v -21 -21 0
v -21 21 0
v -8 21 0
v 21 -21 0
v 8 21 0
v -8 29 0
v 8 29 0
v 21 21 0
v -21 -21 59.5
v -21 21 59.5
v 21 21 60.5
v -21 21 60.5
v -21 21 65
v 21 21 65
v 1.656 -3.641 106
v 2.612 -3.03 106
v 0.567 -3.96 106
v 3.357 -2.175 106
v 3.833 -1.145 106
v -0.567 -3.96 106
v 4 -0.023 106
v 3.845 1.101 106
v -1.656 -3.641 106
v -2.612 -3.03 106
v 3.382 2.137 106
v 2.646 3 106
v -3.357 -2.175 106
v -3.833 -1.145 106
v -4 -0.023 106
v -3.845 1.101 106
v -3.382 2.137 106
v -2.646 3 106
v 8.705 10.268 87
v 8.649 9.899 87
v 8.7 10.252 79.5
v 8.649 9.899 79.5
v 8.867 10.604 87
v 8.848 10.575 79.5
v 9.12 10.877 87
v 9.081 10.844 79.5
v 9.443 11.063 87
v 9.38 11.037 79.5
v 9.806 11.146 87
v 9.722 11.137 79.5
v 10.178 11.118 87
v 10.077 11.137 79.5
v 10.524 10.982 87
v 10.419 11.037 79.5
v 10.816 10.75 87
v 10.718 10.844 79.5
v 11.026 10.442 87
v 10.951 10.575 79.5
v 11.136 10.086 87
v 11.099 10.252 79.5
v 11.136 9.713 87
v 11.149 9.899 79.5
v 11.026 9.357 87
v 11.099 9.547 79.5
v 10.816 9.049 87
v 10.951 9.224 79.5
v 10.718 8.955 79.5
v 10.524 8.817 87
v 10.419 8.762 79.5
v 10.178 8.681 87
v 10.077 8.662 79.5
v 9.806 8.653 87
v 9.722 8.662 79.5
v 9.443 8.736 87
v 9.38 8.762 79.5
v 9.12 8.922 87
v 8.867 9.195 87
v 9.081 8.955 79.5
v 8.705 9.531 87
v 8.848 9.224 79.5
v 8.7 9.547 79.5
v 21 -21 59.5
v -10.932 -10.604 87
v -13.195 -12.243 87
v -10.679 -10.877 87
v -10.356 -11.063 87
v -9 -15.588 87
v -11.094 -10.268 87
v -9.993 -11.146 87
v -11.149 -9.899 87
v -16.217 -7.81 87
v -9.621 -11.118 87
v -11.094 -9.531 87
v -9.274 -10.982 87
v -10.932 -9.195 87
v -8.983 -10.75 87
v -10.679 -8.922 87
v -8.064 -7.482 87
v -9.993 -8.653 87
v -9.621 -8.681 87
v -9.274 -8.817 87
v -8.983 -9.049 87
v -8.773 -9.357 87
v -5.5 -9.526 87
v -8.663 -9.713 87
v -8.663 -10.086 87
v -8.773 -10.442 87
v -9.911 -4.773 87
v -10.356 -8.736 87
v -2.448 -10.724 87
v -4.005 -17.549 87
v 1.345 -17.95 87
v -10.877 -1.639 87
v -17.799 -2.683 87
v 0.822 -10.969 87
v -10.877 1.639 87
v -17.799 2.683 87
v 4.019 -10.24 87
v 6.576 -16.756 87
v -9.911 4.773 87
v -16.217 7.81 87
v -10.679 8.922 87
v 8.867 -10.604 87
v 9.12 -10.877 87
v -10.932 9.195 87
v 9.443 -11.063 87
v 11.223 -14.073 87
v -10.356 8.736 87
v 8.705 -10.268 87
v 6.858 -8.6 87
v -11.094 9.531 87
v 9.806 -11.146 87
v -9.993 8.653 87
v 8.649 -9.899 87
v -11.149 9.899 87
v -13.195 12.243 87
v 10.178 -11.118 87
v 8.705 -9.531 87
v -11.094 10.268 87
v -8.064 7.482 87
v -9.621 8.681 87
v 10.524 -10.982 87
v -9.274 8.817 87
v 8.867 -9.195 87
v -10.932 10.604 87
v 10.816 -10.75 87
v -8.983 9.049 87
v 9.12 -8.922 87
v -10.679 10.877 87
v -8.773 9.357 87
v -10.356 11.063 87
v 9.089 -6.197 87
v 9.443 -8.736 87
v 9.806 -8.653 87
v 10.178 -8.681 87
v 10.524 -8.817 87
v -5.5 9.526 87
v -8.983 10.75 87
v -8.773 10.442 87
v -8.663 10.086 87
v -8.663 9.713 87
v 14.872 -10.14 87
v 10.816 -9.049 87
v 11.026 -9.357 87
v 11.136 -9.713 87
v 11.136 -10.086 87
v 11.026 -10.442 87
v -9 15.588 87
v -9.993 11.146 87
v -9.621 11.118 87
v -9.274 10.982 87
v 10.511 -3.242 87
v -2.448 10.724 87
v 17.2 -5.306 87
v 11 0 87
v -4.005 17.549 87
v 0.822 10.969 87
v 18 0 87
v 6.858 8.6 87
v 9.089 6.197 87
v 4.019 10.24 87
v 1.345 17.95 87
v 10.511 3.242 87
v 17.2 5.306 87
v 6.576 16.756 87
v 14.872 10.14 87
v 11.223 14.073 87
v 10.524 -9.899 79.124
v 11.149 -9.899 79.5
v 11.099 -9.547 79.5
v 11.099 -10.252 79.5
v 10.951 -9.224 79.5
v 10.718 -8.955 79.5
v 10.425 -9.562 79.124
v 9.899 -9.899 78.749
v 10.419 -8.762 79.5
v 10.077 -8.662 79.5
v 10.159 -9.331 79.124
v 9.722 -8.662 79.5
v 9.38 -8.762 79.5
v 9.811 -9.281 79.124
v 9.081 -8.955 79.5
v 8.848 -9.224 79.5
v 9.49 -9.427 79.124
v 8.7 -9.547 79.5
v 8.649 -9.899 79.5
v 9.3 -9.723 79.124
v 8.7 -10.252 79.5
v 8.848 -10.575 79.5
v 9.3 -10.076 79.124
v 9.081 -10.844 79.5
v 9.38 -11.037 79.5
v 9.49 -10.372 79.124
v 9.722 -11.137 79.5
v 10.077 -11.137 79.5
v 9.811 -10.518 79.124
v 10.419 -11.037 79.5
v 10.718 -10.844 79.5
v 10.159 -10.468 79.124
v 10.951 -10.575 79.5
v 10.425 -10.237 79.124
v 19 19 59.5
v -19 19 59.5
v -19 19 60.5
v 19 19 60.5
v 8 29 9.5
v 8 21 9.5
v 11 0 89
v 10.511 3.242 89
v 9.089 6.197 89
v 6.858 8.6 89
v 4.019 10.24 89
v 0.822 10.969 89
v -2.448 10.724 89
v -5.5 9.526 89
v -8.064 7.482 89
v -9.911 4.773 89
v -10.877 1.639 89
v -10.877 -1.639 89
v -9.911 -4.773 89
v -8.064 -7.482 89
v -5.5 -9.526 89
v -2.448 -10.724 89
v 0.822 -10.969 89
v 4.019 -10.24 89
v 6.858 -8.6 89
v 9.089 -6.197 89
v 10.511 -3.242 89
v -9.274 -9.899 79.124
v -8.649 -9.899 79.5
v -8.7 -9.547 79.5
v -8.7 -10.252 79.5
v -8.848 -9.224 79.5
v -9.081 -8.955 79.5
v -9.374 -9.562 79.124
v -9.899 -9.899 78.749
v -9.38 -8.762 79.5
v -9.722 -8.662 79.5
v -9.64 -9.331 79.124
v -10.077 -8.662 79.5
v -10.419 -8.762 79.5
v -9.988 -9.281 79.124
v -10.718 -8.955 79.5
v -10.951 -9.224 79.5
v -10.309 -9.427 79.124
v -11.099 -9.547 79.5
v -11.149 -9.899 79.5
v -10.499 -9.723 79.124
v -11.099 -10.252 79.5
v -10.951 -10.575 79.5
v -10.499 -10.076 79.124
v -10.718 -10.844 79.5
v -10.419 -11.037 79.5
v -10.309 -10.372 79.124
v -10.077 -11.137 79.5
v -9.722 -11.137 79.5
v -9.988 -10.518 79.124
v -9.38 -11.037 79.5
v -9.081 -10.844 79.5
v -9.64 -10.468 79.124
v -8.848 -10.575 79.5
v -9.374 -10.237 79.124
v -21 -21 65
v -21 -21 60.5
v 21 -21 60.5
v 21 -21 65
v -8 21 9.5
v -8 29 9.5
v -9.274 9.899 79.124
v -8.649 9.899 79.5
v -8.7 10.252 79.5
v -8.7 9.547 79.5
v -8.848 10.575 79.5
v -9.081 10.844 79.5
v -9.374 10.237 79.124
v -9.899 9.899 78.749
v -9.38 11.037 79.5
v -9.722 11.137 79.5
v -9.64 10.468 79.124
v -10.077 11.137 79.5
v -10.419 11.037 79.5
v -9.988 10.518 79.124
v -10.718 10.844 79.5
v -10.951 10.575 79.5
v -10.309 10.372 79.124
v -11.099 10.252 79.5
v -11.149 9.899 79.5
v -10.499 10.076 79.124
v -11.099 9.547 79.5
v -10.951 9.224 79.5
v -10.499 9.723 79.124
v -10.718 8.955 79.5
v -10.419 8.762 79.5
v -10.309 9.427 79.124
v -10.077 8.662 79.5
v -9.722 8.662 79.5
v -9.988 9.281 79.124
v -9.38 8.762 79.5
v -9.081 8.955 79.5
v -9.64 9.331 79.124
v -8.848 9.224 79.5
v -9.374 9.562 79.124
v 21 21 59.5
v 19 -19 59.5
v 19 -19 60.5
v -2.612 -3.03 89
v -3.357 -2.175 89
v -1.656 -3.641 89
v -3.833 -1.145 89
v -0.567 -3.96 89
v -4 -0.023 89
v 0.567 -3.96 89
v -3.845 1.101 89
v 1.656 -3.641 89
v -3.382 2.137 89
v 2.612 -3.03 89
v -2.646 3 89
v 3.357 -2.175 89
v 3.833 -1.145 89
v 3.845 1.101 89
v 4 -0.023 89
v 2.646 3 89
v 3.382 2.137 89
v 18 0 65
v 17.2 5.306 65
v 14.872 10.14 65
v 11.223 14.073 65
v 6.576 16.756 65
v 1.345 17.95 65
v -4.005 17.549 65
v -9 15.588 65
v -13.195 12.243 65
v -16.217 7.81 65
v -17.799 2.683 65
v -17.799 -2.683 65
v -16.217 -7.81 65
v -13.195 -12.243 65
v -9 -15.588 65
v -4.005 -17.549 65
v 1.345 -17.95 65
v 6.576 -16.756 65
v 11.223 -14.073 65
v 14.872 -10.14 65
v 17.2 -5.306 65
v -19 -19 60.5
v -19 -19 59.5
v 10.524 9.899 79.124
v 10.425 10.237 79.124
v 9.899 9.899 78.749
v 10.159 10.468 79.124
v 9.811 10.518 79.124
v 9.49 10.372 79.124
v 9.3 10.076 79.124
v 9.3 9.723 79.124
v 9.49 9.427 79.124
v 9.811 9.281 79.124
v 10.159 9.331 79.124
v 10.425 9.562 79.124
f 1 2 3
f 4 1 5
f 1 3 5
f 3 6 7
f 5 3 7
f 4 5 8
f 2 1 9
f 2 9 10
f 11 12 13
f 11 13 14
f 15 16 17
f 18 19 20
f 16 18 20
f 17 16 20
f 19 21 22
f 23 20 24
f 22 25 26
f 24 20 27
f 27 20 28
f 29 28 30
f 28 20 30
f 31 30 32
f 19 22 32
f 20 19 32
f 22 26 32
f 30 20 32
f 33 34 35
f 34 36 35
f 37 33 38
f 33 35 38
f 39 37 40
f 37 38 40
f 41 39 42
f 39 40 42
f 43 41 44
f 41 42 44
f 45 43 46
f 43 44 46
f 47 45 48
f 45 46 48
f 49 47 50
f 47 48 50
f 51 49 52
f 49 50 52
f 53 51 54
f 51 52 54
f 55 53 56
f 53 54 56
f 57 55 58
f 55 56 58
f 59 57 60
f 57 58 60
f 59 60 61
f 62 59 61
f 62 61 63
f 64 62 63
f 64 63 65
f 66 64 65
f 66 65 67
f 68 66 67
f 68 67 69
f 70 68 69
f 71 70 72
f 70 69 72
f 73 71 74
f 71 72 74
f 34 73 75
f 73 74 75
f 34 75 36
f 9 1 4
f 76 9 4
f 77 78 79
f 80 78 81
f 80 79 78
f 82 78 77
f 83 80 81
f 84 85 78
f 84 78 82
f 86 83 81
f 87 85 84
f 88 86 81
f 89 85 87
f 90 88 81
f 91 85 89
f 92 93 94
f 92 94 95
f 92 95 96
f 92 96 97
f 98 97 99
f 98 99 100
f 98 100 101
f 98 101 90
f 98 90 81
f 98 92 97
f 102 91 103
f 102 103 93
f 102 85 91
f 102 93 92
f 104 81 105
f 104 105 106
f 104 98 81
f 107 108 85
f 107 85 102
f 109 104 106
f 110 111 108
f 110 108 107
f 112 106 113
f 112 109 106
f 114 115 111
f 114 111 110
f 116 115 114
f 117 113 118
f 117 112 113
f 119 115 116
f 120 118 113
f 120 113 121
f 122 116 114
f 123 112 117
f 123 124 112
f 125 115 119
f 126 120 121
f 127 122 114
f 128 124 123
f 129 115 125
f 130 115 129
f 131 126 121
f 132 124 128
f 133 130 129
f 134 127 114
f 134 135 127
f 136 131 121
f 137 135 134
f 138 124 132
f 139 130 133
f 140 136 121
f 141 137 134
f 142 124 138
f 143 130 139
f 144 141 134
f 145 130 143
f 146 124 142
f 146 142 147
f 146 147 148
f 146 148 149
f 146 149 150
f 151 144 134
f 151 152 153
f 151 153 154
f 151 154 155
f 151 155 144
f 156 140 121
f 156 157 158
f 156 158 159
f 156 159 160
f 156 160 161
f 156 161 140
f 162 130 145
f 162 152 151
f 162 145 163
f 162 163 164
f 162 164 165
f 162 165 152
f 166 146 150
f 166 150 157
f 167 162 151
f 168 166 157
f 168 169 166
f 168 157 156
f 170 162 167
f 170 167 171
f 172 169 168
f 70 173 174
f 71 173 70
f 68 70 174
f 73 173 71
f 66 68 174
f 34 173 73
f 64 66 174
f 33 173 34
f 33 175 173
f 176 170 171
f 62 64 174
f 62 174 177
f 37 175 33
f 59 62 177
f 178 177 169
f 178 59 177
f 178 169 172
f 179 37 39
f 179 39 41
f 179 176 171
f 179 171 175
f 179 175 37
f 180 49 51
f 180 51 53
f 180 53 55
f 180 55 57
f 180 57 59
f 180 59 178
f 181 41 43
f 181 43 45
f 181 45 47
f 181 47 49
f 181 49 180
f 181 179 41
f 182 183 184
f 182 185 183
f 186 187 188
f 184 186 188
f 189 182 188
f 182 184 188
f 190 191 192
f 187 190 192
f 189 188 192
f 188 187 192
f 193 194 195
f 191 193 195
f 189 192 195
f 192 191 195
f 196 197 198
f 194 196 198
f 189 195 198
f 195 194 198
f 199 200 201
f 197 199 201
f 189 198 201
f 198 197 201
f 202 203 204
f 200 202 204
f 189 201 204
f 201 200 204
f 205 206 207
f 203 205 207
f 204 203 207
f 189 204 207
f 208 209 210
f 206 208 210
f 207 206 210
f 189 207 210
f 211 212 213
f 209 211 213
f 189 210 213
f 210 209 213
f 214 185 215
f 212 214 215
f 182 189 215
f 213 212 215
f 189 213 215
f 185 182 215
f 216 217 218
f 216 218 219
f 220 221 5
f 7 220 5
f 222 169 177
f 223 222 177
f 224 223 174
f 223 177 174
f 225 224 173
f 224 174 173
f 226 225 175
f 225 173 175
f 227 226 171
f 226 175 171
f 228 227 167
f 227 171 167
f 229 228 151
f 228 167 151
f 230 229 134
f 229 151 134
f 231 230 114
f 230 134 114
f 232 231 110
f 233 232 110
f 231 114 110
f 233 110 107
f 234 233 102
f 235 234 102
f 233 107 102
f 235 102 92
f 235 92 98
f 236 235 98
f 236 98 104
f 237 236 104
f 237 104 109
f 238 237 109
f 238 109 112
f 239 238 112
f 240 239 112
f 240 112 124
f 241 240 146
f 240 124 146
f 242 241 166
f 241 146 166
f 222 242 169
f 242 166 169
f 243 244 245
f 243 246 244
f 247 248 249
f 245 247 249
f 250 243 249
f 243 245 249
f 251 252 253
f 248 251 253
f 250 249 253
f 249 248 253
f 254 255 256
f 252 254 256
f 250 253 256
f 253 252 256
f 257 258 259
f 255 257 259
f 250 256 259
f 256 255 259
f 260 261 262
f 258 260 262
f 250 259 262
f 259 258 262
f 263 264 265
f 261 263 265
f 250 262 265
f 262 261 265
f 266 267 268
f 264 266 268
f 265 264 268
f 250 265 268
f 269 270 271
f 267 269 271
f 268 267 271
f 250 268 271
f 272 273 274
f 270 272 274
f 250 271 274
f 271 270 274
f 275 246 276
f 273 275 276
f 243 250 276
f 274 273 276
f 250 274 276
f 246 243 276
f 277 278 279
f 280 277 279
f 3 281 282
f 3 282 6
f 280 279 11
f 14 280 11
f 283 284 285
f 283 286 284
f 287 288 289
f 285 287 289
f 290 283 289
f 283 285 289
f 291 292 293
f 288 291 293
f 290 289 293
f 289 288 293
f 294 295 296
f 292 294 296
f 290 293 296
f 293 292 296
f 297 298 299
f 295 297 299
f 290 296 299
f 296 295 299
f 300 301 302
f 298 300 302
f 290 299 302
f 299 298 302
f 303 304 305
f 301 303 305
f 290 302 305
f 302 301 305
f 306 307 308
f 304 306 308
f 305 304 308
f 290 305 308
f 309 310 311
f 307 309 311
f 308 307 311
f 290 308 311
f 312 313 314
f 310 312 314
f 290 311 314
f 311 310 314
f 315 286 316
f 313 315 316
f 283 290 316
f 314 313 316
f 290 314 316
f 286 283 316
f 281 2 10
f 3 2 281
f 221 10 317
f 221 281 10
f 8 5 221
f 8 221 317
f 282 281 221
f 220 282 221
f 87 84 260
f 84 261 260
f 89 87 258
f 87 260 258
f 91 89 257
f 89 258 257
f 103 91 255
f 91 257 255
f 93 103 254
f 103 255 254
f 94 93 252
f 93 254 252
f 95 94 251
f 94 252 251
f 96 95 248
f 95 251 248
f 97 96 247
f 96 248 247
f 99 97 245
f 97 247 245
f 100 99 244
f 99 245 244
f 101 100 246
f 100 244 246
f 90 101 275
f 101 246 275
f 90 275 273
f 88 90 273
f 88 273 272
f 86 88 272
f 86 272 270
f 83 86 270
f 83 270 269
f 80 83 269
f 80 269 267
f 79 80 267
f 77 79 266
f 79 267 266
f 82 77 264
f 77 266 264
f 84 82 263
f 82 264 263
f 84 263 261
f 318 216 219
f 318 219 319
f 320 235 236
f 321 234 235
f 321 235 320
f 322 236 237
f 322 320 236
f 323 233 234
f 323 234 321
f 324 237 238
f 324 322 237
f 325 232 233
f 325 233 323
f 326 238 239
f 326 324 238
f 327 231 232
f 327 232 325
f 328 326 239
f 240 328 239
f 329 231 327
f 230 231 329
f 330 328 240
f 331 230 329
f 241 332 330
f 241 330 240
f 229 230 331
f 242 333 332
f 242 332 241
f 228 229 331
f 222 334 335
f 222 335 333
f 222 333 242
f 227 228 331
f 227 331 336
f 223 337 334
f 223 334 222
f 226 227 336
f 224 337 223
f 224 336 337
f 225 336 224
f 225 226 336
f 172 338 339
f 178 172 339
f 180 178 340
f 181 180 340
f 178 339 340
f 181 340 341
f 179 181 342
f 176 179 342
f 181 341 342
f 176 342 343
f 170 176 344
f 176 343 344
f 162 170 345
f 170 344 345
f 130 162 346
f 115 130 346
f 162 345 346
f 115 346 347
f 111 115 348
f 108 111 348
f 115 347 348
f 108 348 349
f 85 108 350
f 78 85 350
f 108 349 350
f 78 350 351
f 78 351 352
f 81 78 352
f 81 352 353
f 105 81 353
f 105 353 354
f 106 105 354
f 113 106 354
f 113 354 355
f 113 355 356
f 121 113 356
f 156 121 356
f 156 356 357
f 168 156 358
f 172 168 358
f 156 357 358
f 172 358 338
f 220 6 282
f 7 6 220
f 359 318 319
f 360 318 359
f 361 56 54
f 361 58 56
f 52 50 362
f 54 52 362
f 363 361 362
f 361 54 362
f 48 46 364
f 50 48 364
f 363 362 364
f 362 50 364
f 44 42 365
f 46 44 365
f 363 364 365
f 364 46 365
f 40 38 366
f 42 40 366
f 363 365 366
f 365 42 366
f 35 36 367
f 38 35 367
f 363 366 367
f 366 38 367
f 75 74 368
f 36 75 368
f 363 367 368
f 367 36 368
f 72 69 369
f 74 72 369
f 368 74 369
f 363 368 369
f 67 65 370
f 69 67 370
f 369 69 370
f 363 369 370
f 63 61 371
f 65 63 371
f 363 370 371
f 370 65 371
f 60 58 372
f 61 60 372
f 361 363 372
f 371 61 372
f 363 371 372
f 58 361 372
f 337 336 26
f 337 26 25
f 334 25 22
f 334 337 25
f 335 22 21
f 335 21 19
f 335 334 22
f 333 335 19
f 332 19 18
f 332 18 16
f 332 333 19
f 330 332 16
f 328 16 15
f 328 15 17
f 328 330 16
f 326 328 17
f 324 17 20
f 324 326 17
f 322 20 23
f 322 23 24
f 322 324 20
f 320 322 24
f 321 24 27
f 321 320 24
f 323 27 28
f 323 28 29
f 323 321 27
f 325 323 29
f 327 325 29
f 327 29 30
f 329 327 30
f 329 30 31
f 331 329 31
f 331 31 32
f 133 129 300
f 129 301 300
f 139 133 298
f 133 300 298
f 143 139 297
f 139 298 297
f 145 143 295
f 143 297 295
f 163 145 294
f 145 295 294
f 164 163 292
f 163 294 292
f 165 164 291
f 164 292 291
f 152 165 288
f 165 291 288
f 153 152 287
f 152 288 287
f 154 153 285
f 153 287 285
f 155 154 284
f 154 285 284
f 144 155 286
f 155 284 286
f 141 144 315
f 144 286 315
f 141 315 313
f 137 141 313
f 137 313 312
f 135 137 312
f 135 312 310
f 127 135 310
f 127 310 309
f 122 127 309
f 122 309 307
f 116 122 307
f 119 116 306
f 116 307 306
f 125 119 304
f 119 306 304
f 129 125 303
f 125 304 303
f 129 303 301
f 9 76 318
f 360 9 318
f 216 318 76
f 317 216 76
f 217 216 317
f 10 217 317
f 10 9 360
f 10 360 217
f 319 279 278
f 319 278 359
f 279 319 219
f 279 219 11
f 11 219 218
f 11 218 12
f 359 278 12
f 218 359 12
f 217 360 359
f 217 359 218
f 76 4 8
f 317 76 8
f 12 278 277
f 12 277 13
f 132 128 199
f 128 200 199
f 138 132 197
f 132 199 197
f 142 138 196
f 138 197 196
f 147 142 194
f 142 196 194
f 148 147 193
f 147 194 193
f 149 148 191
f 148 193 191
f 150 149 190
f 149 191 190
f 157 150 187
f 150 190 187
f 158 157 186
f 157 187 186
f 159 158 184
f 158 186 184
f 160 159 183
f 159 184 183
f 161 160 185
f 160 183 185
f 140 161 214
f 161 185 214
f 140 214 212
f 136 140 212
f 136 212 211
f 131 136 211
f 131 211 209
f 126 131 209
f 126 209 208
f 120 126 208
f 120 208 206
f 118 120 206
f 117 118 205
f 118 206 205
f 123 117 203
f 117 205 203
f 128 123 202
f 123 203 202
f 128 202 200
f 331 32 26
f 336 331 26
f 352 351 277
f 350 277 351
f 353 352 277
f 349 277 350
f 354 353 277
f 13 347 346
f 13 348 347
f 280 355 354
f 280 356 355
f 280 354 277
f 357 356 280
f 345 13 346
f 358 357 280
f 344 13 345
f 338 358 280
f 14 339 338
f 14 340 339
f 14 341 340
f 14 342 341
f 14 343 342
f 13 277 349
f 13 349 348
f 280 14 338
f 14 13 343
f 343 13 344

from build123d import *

# Parameters (mm, degrees)
SKETCH_1_W               = 42
SKETCH_1_H               = 42
EXTRUDE_1_DEPTH          = 65
SKETCH_2_R               = 18
EXTRUDE_2_DEPTH          = 22
EXTRUDE_3_DEPTH          = 19
SKETCH_4_R               = 11
EXTRUDE_4_DEPTH          = 2
SKETCH_6_W               = 43
SKETCH_6_H               = 1
CUT_EXTRUDE_1_DEPTH      = 2
PATTERN_CIRCULAR_1_COUNT = 4
HOLE_WIZARD_M3_1_D       = 2.5
HOLE_WIZARD_M3_1_DEPTH   = 7.5
HOLE_WIZARD_M3_1_TIP     = 0.751075774
SKETCH_9_W               = 16
SKETCH_9_H               = 9.5
EXTRUDE_5_DEPTH          = 8


with BuildPart() as part:
    # 草图1 → 凸台-拉伸1 (new body)
    with BuildSketch(Plane.XY):
        Rectangle(SKETCH_1_W, SKETCH_1_H)
    extrude(amount=EXTRUDE_1_DEPTH)

    # 草图2 → 凸台-拉伸2 (add)
    with BuildSketch(Plane.XY.offset(65)):
        Circle(SKETCH_2_R)
    extrude(amount=EXTRUDE_2_DEPTH)

    # 草图3 → 凸台-拉伸3 (add)
    with BuildSketch(Plane.XY.offset(87)):
        with BuildLine():
            Line((-2.645751311, 3), (2.645751311, 3))
            ThreePointArc((2.645751311, 3), (0, -4), (-2.645751311, 3))
        make_face()
    extrude(amount=EXTRUDE_3_DEPTH)

    # 草图4 → 凸台-拉伸4 (add)
    with BuildSketch(Plane.XY.offset(87)):
        Circle(SKETCH_4_R)
    extrude(amount=EXTRUDE_4_DEPTH)

    # 草图6 → 切除-拉伸1 (cut)
    with BuildSketch(Plane(origin=(0, 21, 0), x_dir=(1, 0, 0), z_dir=(0, 1, 0))):
        with Locations((0, -60)):
            Rectangle(SKETCH_6_W, SKETCH_6_H)
    cut_extrude_1 = extrude(amount=-CUT_EXTRUDE_1_DEPTH, mode=Mode.SUBTRACT)

    # 阵列(圆周)1: 切除-拉伸1 ×4 about axis
    pattern_circular_1_axis = Axis((0, 0, 0), (0, 0, 1))
    for i in range(1, PATTERN_CIRCULAR_1_COUNT):
        add(cut_extrude_1.rotate(pattern_circular_1_axis, i * 360 / PATTERN_CIRCULAR_1_COUNT), mode=Mode.SUBTRACT)

    # M3 螺纹孔1
    with Locations(Plane(origin=(-9.899494937, 9.899494937, 87), x_dir=(1, 0, 0), z_dir=(0, 0, 1))):
        with Locations((0, 0), (0, -19.798989874), (19.798989874, 0), (19.798989874, -19.798989874)):
            Hole(HOLE_WIZARD_M3_1_D / 2, depth=HOLE_WIZARD_M3_1_DEPTH)
            with Locations((0, 0, -(HOLE_WIZARD_M3_1_DEPTH + HOLE_WIZARD_M3_1_TIP / 2))):  # 118° drill point
                Cone(0, HOLE_WIZARD_M3_1_D / 2, HOLE_WIZARD_M3_1_TIP, mode=Mode.SUBTRACT)

    # 草图9 → 凸台-拉伸5 (add)
    with BuildSketch(Plane(origin=(0, 21, 0), x_dir=(1, 0, 0), z_dir=(0, 1, 0))):
        with Locations((0, -4.75)):
            Rectangle(SKETCH_9_W, SKETCH_9_H)
    extrude(amount=EXTRUDE_5_DEPTH)


solid = part.part
